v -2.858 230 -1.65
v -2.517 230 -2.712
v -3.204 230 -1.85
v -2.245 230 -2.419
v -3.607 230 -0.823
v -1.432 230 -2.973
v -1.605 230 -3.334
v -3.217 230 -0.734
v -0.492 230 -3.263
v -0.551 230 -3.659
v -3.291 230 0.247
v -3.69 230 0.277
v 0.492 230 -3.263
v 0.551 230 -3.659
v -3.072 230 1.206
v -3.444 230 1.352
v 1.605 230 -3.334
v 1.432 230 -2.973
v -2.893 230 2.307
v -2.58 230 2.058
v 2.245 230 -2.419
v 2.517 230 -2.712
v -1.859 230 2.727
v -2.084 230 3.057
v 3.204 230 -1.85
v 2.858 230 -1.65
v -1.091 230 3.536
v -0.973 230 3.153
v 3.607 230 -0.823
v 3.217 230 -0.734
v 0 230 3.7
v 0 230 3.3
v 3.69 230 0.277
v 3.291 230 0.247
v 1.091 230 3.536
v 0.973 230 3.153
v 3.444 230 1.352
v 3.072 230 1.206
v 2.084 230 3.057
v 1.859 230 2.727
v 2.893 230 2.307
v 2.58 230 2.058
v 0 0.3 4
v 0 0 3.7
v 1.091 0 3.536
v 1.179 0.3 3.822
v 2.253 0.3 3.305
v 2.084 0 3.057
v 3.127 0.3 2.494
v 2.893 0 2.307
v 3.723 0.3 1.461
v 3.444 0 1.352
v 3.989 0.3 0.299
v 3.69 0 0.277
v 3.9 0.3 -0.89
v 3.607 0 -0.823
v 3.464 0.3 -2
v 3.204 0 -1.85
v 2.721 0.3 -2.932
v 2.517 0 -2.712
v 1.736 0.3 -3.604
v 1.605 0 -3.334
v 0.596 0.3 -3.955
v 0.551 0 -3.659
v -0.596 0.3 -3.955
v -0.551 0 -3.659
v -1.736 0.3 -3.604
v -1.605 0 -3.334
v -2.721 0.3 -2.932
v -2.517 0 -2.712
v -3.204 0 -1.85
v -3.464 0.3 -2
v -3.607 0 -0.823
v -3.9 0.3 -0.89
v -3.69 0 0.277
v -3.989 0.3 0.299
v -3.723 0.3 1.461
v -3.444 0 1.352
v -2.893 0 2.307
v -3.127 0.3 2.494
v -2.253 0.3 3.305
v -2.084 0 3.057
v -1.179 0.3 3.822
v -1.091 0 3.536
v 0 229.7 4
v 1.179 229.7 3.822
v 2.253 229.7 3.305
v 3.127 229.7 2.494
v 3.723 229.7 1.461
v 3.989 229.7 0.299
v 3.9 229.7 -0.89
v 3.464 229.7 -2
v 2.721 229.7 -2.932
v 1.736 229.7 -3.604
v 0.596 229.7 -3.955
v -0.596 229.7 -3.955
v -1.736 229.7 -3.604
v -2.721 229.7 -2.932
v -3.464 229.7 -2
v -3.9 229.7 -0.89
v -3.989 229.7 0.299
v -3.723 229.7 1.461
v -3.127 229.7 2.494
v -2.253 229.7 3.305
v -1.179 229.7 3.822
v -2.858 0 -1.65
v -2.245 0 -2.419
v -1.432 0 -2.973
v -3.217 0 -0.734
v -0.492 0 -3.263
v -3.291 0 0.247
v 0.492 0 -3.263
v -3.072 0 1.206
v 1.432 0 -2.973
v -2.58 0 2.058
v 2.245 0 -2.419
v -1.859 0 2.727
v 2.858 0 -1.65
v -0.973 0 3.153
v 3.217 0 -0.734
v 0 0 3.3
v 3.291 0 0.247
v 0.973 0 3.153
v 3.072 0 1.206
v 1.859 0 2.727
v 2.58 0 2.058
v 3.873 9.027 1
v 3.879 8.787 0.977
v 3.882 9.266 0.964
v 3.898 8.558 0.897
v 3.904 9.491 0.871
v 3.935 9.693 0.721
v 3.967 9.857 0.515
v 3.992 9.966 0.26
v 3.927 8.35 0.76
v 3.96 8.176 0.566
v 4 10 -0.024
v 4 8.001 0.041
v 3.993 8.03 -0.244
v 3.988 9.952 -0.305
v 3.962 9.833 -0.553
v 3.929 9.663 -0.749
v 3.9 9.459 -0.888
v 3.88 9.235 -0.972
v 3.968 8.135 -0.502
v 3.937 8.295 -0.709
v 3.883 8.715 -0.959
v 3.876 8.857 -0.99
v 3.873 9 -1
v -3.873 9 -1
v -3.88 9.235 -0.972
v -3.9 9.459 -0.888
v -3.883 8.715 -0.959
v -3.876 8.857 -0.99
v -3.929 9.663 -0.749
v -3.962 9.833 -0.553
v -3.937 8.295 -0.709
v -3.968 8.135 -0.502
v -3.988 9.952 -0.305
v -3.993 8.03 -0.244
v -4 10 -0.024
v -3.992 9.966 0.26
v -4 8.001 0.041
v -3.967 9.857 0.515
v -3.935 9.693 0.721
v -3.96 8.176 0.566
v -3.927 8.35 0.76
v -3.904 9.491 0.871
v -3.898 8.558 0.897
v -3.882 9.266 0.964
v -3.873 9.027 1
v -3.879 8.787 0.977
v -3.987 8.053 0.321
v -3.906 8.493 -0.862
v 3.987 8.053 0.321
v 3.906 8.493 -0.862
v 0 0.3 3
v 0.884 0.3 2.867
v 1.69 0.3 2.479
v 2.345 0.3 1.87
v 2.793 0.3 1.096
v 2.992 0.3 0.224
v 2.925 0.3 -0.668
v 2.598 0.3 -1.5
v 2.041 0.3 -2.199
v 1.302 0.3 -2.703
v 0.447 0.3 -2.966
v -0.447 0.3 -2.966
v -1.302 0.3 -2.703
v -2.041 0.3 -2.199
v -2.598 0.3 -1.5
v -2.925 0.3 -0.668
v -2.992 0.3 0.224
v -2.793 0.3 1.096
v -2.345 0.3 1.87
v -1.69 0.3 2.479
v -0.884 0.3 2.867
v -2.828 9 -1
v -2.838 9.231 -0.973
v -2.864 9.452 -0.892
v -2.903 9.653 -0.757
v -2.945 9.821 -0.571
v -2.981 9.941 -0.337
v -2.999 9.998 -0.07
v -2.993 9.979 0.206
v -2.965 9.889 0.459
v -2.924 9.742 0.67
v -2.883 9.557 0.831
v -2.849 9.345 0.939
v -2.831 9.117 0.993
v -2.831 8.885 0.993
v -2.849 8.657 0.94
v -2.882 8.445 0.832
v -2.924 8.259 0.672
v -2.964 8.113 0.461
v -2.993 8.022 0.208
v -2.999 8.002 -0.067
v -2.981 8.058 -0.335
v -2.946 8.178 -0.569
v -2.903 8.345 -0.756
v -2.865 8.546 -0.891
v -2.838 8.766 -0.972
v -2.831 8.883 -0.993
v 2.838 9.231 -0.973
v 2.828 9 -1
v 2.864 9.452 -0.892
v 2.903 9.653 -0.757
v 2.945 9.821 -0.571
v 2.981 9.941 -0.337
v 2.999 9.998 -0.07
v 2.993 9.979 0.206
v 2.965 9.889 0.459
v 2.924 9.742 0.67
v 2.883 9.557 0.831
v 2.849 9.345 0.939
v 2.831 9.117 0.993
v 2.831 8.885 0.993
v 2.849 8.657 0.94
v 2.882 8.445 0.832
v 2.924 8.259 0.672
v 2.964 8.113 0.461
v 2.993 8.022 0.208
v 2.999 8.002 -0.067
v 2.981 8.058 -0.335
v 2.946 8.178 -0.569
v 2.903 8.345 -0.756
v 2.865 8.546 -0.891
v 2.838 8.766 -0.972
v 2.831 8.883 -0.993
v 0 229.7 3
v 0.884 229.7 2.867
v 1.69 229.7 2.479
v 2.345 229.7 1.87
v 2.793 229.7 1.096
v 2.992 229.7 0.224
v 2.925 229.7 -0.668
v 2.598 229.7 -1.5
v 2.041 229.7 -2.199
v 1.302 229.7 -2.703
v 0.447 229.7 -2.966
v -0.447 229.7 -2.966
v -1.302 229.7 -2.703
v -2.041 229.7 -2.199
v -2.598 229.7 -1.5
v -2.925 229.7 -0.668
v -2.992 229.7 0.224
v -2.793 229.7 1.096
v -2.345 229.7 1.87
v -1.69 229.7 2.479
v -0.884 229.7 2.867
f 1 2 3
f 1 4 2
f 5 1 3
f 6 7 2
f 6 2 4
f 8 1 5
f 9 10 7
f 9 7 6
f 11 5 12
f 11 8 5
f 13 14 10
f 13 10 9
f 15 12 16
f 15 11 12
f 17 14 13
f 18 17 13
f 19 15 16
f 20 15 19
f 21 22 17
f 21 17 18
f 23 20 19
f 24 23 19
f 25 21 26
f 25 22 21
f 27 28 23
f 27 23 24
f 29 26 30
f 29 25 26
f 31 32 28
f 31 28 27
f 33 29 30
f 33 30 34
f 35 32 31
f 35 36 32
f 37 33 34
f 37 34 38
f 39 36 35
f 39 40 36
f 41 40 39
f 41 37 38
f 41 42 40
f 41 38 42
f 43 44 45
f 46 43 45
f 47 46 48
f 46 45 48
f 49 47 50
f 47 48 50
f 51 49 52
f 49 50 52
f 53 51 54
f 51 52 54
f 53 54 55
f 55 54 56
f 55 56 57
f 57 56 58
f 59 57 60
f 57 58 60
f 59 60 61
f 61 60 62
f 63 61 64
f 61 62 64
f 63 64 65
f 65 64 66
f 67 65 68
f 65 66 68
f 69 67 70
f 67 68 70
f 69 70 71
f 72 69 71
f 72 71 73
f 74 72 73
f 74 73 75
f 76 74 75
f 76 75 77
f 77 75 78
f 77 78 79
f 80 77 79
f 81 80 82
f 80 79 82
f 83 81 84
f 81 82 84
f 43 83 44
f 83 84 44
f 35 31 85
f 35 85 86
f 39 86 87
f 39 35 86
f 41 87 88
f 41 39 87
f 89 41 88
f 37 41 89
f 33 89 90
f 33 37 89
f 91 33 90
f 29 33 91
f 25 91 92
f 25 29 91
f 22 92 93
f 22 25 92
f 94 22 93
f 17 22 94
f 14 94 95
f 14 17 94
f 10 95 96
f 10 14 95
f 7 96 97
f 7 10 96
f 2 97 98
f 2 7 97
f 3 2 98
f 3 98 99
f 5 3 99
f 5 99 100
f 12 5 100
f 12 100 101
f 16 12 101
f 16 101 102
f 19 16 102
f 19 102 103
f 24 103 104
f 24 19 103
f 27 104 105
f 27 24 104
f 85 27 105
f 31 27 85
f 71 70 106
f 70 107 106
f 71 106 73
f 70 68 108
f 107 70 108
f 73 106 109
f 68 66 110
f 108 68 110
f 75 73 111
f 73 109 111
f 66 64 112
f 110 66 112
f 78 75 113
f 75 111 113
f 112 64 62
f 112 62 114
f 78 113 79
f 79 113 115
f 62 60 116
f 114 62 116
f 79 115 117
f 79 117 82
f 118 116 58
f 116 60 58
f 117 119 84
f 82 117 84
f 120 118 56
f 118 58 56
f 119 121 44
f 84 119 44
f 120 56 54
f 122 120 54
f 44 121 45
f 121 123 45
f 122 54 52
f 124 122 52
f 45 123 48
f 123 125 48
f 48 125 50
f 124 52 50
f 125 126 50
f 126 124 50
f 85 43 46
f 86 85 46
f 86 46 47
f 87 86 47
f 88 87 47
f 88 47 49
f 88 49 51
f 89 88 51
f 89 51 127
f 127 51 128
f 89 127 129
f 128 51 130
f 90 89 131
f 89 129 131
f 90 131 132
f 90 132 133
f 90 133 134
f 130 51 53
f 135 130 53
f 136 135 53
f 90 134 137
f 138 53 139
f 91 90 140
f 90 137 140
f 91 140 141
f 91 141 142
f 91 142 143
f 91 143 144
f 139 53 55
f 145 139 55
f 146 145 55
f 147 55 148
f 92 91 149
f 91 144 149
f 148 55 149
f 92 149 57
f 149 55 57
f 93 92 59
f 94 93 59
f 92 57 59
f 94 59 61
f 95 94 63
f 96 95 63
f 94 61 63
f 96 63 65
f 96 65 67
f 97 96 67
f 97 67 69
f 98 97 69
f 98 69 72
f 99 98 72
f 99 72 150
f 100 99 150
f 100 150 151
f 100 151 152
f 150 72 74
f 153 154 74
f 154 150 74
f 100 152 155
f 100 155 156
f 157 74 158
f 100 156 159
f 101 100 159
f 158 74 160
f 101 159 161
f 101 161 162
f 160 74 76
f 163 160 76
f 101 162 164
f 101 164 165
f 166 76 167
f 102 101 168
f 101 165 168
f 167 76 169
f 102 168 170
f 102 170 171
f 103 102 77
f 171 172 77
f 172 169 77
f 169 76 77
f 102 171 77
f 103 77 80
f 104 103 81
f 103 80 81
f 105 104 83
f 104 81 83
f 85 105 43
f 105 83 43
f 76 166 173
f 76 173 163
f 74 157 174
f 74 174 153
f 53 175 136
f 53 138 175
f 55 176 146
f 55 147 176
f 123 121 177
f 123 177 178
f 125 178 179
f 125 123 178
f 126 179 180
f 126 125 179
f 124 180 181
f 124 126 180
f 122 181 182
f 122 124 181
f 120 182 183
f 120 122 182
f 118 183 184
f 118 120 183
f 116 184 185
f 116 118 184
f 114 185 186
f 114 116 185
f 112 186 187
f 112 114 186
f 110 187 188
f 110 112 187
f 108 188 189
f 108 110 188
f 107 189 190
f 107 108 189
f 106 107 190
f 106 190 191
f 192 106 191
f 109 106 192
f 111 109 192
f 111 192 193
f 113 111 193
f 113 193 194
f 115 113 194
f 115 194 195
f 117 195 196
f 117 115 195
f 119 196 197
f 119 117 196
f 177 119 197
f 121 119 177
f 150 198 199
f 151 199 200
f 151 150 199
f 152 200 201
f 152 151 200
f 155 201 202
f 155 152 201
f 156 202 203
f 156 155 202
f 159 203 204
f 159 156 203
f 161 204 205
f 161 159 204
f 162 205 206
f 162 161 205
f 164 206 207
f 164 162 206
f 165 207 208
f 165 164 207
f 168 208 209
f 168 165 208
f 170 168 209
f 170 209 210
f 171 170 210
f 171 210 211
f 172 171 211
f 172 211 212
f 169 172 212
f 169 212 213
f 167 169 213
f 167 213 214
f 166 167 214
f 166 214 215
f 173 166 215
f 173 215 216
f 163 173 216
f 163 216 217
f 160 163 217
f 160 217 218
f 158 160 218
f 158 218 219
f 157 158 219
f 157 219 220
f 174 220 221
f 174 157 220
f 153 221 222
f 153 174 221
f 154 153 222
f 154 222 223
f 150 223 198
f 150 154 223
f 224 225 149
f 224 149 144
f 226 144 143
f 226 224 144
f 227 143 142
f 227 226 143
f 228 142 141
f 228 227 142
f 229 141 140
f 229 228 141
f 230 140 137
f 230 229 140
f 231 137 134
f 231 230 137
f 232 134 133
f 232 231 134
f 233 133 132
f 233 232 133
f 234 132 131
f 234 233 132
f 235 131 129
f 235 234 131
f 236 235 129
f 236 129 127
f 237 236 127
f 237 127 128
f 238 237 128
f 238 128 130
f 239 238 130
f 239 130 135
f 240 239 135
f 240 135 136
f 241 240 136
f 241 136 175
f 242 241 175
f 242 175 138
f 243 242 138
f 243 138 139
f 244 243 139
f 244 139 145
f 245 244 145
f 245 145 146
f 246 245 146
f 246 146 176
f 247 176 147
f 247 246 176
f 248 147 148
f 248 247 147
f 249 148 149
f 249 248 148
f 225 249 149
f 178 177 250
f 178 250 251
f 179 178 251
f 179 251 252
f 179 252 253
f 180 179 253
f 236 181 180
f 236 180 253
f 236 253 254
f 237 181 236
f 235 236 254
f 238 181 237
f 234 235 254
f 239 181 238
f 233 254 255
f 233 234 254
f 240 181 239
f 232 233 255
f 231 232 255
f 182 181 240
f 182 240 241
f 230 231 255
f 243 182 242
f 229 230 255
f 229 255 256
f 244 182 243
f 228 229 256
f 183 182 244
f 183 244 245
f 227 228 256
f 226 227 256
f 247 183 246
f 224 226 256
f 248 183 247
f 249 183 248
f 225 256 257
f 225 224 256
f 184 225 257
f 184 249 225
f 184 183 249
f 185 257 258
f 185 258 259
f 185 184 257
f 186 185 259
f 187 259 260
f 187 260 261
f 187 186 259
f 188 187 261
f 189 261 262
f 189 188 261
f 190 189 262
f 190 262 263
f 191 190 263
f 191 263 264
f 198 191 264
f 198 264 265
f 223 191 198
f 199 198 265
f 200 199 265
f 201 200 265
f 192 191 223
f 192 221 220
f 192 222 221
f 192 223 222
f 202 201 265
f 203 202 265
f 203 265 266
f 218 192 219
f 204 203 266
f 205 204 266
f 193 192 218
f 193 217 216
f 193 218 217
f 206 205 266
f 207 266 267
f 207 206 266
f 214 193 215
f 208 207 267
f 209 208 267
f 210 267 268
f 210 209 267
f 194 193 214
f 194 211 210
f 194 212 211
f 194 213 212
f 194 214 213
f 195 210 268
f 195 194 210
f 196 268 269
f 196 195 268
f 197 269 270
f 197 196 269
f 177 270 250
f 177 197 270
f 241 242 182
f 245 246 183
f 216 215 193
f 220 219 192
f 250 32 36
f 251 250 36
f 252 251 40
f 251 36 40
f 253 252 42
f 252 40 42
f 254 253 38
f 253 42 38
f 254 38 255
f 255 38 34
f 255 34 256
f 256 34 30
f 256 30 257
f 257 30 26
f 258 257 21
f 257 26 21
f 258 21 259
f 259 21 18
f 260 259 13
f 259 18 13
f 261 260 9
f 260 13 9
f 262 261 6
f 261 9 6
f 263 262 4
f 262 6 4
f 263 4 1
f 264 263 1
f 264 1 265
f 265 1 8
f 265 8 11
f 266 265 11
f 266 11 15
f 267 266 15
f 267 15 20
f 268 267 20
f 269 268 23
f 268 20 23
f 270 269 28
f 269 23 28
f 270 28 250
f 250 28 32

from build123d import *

# Parameters (mm, degrees)
SKETCH_1_R               = 4
SKETCH_1_R_2             = 3
EXTRUDE_1_DEPTH          = 230
CHAMFER_1_SIZE           = 0.3
CUT_EXTRUDE_1_DEPTH      = 231.0695547
CUT_EXTRUDE_1_DEPTH_BACK = 231.0695547
SKETCH_2_R               = 1


with BuildPart() as part:
    # Эскиз1 → Бобышка-Вытянуть1 (new body)
    with BuildSketch(Plane(origin=(0, 0, 0), x_dir=(1, 0, 0), z_dir=(0, 1, 0))):
        with Locations(Location((0, 0, 0), (0, 0, 270))):
            Circle(SKETCH_1_R)
        with Locations(Location((0, 0, 0), (0, 0, 270))):
            Circle(SKETCH_1_R_2, mode=Mode.SUBTRACT)
    extrude(amount=EXTRUDE_1_DEPTH)

    # Фаска1
    chamfer_1_edges = [part.edges().sort_by_distance(p)[0] for p in [
        (0, 0, -4),
        (0, 230, -4),
        (0, 0, -3),
        (0, 230, -3),
    ]]
    chamfer(chamfer_1_edges, length=CHAMFER_1_SIZE)

    # Эскиз2 → Вырез-Вытянуть1 (cut, two sides: drawn at the far end of the back side and taken through both)
    with BuildSketch(Plane(origin=(0, 0, 0), x_dir=(0, 0, -1), z_dir=(1, 0, 0)).offset(-CUT_EXTRUDE_1_DEPTH_BACK)):
        with Locations((0, 9)):
            Circle(SKETCH_2_R)
    extrude(amount=CUT_EXTRUDE_1_DEPTH + CUT_EXTRUDE_1_DEPTH_BACK, mode=Mode.SUBTRACT)


solid = part.part
